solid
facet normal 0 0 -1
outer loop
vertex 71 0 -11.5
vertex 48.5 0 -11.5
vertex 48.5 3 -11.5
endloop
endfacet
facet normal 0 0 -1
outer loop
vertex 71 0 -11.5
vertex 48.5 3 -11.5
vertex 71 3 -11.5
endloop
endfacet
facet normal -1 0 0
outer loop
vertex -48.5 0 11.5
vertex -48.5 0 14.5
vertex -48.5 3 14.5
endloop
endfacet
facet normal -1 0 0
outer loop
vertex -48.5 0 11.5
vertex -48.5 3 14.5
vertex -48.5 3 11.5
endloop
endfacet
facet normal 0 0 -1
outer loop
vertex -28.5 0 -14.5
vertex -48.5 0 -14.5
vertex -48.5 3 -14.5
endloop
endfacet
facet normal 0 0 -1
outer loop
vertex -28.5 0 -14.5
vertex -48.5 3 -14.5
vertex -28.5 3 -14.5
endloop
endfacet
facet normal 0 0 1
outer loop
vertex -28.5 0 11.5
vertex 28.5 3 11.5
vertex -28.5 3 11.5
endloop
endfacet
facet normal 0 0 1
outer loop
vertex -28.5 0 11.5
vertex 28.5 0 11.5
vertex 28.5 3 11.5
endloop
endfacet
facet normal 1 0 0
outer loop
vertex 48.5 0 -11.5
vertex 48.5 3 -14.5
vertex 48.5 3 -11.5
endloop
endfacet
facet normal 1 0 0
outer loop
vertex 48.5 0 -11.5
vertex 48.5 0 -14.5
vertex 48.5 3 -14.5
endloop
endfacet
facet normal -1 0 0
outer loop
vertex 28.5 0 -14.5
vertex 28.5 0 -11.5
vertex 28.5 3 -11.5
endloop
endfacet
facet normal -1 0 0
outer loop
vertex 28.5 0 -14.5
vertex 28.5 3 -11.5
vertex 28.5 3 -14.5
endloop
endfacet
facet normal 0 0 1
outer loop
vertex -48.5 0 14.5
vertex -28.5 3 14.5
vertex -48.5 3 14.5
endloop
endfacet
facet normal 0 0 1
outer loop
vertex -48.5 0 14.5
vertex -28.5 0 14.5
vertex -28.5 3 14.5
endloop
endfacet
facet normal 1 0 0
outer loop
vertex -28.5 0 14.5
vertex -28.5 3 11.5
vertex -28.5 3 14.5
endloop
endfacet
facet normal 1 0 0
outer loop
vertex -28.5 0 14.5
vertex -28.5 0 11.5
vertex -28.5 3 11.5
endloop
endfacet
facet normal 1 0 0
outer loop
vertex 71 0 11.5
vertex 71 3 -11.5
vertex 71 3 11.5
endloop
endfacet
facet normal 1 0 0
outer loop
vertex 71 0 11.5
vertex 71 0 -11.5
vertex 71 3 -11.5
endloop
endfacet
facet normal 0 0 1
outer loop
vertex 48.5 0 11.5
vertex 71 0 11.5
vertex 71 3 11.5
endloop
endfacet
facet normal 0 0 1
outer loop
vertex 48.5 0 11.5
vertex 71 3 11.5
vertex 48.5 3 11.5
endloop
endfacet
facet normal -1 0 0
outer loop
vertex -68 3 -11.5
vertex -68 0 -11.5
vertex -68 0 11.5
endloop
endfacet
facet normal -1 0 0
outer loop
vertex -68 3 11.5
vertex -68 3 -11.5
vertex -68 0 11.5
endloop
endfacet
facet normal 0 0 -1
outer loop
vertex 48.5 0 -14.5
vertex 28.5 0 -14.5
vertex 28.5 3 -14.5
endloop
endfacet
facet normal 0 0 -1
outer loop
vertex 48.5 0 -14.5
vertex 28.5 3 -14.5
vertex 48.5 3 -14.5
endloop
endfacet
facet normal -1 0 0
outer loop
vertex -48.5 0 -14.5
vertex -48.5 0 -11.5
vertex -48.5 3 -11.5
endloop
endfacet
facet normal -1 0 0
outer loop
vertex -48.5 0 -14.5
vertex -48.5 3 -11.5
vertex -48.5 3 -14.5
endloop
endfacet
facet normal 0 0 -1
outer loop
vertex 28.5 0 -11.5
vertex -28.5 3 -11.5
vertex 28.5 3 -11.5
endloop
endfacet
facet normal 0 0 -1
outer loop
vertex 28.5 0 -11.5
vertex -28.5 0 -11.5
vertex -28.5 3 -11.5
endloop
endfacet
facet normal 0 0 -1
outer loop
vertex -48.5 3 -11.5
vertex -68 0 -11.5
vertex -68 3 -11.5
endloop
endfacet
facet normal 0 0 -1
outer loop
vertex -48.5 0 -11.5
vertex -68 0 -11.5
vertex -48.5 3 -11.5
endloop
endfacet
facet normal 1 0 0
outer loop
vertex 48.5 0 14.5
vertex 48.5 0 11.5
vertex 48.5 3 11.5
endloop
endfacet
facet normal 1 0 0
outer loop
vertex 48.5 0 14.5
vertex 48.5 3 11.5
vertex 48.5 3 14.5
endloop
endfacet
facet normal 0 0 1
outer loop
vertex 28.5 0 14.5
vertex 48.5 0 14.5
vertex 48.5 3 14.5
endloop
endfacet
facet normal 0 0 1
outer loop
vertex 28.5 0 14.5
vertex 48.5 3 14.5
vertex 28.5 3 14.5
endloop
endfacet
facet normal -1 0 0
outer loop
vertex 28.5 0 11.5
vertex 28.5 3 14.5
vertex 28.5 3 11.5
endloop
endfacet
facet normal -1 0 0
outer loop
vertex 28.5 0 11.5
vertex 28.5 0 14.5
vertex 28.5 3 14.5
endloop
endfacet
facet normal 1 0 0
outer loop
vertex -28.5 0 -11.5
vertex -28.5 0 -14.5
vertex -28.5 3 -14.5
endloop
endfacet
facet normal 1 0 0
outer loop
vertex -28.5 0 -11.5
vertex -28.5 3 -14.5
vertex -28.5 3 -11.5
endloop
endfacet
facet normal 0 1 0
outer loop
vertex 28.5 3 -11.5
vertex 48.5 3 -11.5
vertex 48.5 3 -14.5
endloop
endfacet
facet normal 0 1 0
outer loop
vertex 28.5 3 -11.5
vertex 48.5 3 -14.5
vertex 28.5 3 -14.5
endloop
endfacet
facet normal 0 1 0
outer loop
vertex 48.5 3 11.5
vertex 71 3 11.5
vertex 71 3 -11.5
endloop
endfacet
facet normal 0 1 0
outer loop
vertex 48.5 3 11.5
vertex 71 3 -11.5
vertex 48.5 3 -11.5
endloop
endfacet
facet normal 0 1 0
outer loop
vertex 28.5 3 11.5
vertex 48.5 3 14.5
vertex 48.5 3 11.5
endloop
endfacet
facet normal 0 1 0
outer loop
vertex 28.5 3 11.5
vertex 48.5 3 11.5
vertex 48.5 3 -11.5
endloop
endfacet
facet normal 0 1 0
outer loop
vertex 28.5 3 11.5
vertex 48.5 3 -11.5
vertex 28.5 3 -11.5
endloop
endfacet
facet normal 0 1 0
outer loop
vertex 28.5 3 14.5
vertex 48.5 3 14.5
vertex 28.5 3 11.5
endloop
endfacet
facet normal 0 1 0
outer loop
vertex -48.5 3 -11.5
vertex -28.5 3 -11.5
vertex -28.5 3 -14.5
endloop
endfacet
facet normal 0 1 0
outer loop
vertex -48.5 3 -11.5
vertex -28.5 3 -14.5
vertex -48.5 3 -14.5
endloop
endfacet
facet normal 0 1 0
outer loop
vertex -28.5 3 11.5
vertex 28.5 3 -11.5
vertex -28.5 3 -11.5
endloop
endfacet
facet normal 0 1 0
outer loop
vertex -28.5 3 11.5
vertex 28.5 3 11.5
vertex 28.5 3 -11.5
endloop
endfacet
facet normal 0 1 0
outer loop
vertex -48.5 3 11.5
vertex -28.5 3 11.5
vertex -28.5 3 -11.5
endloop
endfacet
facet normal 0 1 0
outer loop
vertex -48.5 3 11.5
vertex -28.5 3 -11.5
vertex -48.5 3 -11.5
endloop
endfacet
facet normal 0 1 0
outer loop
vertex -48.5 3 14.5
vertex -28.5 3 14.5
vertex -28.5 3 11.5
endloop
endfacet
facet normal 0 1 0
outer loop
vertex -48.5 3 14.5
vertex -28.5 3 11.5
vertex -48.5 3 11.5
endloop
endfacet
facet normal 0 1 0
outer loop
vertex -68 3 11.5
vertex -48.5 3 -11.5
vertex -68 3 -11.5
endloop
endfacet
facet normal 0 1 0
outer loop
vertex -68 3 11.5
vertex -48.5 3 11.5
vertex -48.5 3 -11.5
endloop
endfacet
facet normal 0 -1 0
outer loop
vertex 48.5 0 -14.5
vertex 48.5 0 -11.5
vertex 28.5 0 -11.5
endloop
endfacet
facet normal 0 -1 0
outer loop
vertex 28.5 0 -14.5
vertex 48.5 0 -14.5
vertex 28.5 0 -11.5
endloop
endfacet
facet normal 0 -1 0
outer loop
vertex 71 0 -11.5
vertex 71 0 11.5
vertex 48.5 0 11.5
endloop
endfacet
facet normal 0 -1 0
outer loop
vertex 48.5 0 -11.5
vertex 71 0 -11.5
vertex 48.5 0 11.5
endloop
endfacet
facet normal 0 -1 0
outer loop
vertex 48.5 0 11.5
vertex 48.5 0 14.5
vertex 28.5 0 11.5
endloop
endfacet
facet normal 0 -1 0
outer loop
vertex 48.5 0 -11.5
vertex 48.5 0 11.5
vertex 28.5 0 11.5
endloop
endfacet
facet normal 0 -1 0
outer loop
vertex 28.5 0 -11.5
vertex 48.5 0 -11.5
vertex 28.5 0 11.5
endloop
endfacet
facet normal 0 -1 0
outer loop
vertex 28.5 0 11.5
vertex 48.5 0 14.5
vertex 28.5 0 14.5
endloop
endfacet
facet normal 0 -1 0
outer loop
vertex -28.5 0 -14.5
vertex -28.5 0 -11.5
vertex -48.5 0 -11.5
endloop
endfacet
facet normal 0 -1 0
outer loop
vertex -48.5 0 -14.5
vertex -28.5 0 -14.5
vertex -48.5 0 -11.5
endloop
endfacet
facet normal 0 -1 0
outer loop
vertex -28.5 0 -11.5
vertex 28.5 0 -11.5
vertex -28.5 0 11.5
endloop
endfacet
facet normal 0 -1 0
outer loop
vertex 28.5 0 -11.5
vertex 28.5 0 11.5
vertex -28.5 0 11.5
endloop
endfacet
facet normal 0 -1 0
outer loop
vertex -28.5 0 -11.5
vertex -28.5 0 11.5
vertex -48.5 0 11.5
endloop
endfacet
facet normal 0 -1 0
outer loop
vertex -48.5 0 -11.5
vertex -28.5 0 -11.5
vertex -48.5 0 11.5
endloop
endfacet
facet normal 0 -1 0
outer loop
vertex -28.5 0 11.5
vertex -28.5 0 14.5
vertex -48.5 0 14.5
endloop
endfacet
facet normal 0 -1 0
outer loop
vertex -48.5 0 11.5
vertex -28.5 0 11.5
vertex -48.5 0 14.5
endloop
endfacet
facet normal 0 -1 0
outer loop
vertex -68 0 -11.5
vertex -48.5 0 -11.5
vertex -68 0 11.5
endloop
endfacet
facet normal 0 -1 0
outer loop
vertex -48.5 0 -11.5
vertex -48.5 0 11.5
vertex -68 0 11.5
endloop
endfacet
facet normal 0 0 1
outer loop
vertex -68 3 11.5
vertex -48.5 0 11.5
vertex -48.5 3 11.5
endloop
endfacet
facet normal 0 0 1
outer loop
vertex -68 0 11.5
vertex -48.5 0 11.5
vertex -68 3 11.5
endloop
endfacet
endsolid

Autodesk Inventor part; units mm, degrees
ref_plane "YZ Plane" through (0, 0, 0) normal (1, 0, 0) x (0, 1, 0)
ref_plane "XZ Plane" through (0, 0, 0) normal (0, 1, 0) x (-1, 0, 0)
ref_plane "XY Plane" through (0, 0, 0) normal (0, 0, 1) x (1, 0, 0)
sketch "Sketch1" plane through (0, 0, 0) normal (0, 1, 0) x (-1, 0, 0)
  line L0 (71, -11.5) -> (-71, -11.5)
  line L1 (-71, -11.5) -> (-71, 11.5)
  line L2 (-71, 11.5) -> (71, 11.5)
  line L3 (71, 11.5) -> (71, -11.5)
  line L4 (68, -11.5) -> (68, 11.5)
  line L5 (48.5, -14.5) -> (28.5, -14.5)
  line L6 (28.5, -14.5) -> (28.5, -11.5)
  line L7 (28.5, -11.5) -> (48.5, -11.5)
  line L8 (48.5, -11.5) -> (48.5, -14.5)
  line L9 (48.5, 11.5) -> (28.5, 11.5)
  line L10 (28.5, 11.5) -> (28.5, 14.5)
  line L11 (28.5, 14.5) -> (48.5, 14.5)
  line L12 (48.5, 14.5) -> (48.5, 11.5)
  line L13 (38.5, -14.5) -> (38.5, -11.5) construction
  line L14 (-48.5, -14.5) -> (-48.5, -11.5)
  line L15 (-38.5, -14.5) -> (-38.5, -11.5) construction
  line L16 (-48.5, -11.5) -> (-28.5, -11.5)
  line L17 (-28.5, 11.5) -> (-48.5, 11.5)
  line L18 (-28.5, -14.5) -> (-48.5, -14.5)
  line L19 (-48.5, 14.5) -> (-28.5, 14.5)
  line L20 (-28.5, 14.5) -> (-28.5, 11.5)
  line L21 (-28.5, -11.5) -> (-28.5, -14.5)
  line L22 (-48.5, 11.5) -> (-48.5, 14.5)
  point P0 (0, 0)
  point P1 (-71, 0)
  point P2 (0, -11.5)
  point P3 (48.5, -11.5)
  point P4 (28.5, -11.5)
  point P5 (-28.5, -11.5)
  point P6 (-48.5, -11.5)
  point P7 (-48.5, 11.5)
  point P8 (-28.5, 11.5)
  point P9 (28.5, 11.5)
  point P10 (48.5, 11.5)
  dimension "d0" = 23
  dimension "d1" = 142
  dimension "d2" = 3
  dimension "d3" = 20
  dimension "d4" = 3
  dimension "d5" = 20
  dimension "d6" = 3
  dimension "d7" = 38.5
  dimension "d10" = 77
extrude "Extrusion1" add sketch "Sketch1" along normal blind 3 contours L0 L1 L2 L4 | L8 L5 L6 L0 | L2 L10 L11 L12 | L21 L18 L14 L0 | L2 L22 L19 L20
equation "\"d0\" = stack"
equation "\"d3\" = finger"
equation "\"d4\" = thickness"
equation "\"d5\" = finger"
equation "\"d15\" = thickness"
equation "\"stack\" = 23"
equation "\"finger\" = 20"
equation "\"thickness\" = 3"
properties part number "BungaSign-Bigger-Sides-LeftRight"
